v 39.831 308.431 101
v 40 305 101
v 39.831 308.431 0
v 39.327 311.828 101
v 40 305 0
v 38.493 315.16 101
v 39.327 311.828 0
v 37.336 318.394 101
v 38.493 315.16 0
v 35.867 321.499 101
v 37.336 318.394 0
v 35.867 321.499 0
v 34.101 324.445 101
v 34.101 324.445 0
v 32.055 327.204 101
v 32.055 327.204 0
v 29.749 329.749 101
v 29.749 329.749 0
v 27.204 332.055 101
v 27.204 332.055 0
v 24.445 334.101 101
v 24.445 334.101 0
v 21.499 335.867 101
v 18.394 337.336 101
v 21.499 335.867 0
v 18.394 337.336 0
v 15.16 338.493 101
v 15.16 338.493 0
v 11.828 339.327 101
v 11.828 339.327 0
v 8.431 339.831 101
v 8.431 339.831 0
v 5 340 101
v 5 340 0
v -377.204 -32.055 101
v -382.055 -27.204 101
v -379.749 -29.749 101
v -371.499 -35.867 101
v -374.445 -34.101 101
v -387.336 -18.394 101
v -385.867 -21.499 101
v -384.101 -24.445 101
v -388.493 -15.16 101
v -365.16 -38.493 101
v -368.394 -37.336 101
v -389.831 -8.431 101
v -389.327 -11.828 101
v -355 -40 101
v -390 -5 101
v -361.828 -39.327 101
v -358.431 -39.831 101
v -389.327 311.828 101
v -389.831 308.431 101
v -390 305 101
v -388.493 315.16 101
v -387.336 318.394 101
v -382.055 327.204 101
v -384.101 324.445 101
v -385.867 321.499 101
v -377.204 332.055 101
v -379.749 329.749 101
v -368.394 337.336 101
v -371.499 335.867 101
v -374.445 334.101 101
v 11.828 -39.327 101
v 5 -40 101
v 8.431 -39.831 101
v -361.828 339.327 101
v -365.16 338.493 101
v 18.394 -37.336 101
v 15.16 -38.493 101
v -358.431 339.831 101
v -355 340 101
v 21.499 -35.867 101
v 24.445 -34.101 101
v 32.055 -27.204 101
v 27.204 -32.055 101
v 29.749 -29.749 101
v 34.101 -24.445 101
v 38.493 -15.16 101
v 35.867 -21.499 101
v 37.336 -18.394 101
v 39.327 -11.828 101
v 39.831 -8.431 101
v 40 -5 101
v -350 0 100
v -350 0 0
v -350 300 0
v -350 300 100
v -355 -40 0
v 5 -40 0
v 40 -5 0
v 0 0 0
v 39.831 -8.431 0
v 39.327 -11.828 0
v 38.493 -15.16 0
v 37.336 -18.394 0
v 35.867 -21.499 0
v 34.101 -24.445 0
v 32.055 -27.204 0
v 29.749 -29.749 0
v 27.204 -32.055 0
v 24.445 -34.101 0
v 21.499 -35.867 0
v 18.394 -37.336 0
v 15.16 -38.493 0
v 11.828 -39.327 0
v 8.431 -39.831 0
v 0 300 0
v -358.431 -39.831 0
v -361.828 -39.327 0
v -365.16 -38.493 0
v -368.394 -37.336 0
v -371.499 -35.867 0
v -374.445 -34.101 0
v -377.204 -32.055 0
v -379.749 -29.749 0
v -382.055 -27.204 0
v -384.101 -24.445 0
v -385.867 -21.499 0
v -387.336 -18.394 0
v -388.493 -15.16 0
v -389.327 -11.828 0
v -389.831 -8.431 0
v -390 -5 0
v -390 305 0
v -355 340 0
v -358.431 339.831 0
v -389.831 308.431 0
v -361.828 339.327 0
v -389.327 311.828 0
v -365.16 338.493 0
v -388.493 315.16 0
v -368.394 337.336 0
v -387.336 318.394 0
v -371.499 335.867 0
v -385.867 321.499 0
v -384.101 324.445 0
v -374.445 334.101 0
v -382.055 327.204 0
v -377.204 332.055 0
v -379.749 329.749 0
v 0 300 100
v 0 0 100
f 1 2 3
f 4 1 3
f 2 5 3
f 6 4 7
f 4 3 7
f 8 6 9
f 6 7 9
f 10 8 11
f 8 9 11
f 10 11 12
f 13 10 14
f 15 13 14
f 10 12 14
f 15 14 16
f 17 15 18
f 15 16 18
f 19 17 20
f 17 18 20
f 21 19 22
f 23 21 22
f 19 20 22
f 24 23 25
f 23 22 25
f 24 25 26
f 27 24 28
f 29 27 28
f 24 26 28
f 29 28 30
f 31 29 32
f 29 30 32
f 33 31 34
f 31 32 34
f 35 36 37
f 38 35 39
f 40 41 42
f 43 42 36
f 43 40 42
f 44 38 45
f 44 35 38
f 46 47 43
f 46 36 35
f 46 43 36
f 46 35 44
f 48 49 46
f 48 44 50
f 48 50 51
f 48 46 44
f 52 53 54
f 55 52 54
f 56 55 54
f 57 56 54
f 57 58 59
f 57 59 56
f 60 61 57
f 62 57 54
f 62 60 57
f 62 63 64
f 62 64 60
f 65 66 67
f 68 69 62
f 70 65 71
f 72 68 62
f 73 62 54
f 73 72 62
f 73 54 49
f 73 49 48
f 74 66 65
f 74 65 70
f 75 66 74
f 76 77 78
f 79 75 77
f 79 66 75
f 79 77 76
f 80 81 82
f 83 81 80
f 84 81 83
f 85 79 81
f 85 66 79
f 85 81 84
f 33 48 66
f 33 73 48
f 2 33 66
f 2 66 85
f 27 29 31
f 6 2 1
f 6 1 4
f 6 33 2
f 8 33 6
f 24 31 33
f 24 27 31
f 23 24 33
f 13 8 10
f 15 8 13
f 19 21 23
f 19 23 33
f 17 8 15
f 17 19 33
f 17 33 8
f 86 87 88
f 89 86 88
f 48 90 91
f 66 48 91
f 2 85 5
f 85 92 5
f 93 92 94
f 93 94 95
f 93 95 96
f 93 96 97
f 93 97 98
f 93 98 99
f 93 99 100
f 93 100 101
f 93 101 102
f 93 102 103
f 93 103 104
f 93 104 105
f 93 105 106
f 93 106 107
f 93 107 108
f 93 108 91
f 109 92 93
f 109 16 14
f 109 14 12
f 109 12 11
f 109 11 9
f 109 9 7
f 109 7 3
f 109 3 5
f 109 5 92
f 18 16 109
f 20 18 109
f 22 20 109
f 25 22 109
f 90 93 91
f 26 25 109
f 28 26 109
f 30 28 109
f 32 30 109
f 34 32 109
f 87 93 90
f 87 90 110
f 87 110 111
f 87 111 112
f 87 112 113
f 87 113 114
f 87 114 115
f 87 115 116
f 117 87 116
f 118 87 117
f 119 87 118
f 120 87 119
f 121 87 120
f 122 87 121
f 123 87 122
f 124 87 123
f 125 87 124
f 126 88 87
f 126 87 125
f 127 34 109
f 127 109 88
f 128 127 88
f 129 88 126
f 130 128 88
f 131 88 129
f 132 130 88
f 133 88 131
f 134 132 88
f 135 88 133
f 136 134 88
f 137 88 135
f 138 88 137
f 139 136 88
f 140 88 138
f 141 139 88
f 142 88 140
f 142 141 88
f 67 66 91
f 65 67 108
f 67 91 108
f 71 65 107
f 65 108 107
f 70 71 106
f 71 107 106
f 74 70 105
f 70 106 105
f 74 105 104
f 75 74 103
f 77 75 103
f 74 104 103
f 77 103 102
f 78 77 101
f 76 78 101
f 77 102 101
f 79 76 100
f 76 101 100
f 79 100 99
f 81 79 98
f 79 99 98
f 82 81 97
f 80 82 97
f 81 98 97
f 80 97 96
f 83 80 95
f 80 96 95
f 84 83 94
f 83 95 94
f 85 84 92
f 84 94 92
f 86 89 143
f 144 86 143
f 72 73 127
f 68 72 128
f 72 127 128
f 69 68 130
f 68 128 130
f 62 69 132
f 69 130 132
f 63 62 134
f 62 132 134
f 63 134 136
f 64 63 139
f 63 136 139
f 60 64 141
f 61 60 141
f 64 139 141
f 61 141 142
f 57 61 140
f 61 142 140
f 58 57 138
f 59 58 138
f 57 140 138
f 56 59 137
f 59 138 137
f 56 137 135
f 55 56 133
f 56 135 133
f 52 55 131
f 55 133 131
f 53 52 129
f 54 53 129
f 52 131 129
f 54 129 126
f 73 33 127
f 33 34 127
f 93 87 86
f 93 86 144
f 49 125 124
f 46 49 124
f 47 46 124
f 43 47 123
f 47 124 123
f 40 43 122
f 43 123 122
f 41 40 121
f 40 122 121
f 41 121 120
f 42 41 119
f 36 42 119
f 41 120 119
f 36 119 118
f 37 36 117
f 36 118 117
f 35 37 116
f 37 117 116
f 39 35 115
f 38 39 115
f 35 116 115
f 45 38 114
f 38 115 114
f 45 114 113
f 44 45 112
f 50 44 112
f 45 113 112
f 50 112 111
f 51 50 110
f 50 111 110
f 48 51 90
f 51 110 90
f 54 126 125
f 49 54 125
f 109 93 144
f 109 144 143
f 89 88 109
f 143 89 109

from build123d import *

# Parameters (mm, degrees)
SKETCH1_W           = 350
SKETCH1_H           = 300
BOSS_EXTRUDE1_DEPTH = 100
BOSS_EXTRUDE2_DEPTH = 1


with BuildPart() as part:
    # Sketch1 → Boss-Extrude1 (new body)
    with BuildSketch(Plane.XY):
        with BuildLine():
            Line((-355, 340), (5, 340))
            ThreePointArc((5, 340), (29.748737342, 329.748737342), (40, 305))
            Line((40, 305), (40, -5))
            ThreePointArc((40, -5), (29.748737342, -29.748737342), (5, -40))
            Line((5, -40), (-355, -40))
            ThreePointArc((-355, -40), (-379.748737342, -29.748737342), (-390, -5))
            Line((-390, -5), (-390, 305))
            ThreePointArc((-390, 305), (-379.748737342, 329.748737342), (-355, 340))
        make_face()
        with Locations((-175, 150)):
            Rectangle(SKETCH1_W, SKETCH1_H, mode=Mode.SUBTRACT)
    extrude(amount=BOSS_EXTRUDE1_DEPTH)

    # Sketch2 → Boss-Extrude2 (add)
    with BuildSketch(Plane.XY.offset(100)):
        with BuildLine():
            Line((-355, -40), (5, -40))
            ThreePointArc((5, -40), (29.748737342, -29.748737342), (40, -5))
            Line((40, -5), (40, 305))
            ThreePointArc((40, 305), (29.748737342, 329.748737342), (5, 340))
            Line((5, 340), (-355, 340))
            ThreePointArc((-355, 340), (-379.748737342, 329.748737342), (-390, 305))
            Line((-390, 305), (-390, -5))
            ThreePointArc((-390, -5), (-379.748737342, -29.748737342), (-355, -40))
        make_face()
    extrude(amount=BOSS_EXTRUDE2_DEPTH)


solid = part.part
